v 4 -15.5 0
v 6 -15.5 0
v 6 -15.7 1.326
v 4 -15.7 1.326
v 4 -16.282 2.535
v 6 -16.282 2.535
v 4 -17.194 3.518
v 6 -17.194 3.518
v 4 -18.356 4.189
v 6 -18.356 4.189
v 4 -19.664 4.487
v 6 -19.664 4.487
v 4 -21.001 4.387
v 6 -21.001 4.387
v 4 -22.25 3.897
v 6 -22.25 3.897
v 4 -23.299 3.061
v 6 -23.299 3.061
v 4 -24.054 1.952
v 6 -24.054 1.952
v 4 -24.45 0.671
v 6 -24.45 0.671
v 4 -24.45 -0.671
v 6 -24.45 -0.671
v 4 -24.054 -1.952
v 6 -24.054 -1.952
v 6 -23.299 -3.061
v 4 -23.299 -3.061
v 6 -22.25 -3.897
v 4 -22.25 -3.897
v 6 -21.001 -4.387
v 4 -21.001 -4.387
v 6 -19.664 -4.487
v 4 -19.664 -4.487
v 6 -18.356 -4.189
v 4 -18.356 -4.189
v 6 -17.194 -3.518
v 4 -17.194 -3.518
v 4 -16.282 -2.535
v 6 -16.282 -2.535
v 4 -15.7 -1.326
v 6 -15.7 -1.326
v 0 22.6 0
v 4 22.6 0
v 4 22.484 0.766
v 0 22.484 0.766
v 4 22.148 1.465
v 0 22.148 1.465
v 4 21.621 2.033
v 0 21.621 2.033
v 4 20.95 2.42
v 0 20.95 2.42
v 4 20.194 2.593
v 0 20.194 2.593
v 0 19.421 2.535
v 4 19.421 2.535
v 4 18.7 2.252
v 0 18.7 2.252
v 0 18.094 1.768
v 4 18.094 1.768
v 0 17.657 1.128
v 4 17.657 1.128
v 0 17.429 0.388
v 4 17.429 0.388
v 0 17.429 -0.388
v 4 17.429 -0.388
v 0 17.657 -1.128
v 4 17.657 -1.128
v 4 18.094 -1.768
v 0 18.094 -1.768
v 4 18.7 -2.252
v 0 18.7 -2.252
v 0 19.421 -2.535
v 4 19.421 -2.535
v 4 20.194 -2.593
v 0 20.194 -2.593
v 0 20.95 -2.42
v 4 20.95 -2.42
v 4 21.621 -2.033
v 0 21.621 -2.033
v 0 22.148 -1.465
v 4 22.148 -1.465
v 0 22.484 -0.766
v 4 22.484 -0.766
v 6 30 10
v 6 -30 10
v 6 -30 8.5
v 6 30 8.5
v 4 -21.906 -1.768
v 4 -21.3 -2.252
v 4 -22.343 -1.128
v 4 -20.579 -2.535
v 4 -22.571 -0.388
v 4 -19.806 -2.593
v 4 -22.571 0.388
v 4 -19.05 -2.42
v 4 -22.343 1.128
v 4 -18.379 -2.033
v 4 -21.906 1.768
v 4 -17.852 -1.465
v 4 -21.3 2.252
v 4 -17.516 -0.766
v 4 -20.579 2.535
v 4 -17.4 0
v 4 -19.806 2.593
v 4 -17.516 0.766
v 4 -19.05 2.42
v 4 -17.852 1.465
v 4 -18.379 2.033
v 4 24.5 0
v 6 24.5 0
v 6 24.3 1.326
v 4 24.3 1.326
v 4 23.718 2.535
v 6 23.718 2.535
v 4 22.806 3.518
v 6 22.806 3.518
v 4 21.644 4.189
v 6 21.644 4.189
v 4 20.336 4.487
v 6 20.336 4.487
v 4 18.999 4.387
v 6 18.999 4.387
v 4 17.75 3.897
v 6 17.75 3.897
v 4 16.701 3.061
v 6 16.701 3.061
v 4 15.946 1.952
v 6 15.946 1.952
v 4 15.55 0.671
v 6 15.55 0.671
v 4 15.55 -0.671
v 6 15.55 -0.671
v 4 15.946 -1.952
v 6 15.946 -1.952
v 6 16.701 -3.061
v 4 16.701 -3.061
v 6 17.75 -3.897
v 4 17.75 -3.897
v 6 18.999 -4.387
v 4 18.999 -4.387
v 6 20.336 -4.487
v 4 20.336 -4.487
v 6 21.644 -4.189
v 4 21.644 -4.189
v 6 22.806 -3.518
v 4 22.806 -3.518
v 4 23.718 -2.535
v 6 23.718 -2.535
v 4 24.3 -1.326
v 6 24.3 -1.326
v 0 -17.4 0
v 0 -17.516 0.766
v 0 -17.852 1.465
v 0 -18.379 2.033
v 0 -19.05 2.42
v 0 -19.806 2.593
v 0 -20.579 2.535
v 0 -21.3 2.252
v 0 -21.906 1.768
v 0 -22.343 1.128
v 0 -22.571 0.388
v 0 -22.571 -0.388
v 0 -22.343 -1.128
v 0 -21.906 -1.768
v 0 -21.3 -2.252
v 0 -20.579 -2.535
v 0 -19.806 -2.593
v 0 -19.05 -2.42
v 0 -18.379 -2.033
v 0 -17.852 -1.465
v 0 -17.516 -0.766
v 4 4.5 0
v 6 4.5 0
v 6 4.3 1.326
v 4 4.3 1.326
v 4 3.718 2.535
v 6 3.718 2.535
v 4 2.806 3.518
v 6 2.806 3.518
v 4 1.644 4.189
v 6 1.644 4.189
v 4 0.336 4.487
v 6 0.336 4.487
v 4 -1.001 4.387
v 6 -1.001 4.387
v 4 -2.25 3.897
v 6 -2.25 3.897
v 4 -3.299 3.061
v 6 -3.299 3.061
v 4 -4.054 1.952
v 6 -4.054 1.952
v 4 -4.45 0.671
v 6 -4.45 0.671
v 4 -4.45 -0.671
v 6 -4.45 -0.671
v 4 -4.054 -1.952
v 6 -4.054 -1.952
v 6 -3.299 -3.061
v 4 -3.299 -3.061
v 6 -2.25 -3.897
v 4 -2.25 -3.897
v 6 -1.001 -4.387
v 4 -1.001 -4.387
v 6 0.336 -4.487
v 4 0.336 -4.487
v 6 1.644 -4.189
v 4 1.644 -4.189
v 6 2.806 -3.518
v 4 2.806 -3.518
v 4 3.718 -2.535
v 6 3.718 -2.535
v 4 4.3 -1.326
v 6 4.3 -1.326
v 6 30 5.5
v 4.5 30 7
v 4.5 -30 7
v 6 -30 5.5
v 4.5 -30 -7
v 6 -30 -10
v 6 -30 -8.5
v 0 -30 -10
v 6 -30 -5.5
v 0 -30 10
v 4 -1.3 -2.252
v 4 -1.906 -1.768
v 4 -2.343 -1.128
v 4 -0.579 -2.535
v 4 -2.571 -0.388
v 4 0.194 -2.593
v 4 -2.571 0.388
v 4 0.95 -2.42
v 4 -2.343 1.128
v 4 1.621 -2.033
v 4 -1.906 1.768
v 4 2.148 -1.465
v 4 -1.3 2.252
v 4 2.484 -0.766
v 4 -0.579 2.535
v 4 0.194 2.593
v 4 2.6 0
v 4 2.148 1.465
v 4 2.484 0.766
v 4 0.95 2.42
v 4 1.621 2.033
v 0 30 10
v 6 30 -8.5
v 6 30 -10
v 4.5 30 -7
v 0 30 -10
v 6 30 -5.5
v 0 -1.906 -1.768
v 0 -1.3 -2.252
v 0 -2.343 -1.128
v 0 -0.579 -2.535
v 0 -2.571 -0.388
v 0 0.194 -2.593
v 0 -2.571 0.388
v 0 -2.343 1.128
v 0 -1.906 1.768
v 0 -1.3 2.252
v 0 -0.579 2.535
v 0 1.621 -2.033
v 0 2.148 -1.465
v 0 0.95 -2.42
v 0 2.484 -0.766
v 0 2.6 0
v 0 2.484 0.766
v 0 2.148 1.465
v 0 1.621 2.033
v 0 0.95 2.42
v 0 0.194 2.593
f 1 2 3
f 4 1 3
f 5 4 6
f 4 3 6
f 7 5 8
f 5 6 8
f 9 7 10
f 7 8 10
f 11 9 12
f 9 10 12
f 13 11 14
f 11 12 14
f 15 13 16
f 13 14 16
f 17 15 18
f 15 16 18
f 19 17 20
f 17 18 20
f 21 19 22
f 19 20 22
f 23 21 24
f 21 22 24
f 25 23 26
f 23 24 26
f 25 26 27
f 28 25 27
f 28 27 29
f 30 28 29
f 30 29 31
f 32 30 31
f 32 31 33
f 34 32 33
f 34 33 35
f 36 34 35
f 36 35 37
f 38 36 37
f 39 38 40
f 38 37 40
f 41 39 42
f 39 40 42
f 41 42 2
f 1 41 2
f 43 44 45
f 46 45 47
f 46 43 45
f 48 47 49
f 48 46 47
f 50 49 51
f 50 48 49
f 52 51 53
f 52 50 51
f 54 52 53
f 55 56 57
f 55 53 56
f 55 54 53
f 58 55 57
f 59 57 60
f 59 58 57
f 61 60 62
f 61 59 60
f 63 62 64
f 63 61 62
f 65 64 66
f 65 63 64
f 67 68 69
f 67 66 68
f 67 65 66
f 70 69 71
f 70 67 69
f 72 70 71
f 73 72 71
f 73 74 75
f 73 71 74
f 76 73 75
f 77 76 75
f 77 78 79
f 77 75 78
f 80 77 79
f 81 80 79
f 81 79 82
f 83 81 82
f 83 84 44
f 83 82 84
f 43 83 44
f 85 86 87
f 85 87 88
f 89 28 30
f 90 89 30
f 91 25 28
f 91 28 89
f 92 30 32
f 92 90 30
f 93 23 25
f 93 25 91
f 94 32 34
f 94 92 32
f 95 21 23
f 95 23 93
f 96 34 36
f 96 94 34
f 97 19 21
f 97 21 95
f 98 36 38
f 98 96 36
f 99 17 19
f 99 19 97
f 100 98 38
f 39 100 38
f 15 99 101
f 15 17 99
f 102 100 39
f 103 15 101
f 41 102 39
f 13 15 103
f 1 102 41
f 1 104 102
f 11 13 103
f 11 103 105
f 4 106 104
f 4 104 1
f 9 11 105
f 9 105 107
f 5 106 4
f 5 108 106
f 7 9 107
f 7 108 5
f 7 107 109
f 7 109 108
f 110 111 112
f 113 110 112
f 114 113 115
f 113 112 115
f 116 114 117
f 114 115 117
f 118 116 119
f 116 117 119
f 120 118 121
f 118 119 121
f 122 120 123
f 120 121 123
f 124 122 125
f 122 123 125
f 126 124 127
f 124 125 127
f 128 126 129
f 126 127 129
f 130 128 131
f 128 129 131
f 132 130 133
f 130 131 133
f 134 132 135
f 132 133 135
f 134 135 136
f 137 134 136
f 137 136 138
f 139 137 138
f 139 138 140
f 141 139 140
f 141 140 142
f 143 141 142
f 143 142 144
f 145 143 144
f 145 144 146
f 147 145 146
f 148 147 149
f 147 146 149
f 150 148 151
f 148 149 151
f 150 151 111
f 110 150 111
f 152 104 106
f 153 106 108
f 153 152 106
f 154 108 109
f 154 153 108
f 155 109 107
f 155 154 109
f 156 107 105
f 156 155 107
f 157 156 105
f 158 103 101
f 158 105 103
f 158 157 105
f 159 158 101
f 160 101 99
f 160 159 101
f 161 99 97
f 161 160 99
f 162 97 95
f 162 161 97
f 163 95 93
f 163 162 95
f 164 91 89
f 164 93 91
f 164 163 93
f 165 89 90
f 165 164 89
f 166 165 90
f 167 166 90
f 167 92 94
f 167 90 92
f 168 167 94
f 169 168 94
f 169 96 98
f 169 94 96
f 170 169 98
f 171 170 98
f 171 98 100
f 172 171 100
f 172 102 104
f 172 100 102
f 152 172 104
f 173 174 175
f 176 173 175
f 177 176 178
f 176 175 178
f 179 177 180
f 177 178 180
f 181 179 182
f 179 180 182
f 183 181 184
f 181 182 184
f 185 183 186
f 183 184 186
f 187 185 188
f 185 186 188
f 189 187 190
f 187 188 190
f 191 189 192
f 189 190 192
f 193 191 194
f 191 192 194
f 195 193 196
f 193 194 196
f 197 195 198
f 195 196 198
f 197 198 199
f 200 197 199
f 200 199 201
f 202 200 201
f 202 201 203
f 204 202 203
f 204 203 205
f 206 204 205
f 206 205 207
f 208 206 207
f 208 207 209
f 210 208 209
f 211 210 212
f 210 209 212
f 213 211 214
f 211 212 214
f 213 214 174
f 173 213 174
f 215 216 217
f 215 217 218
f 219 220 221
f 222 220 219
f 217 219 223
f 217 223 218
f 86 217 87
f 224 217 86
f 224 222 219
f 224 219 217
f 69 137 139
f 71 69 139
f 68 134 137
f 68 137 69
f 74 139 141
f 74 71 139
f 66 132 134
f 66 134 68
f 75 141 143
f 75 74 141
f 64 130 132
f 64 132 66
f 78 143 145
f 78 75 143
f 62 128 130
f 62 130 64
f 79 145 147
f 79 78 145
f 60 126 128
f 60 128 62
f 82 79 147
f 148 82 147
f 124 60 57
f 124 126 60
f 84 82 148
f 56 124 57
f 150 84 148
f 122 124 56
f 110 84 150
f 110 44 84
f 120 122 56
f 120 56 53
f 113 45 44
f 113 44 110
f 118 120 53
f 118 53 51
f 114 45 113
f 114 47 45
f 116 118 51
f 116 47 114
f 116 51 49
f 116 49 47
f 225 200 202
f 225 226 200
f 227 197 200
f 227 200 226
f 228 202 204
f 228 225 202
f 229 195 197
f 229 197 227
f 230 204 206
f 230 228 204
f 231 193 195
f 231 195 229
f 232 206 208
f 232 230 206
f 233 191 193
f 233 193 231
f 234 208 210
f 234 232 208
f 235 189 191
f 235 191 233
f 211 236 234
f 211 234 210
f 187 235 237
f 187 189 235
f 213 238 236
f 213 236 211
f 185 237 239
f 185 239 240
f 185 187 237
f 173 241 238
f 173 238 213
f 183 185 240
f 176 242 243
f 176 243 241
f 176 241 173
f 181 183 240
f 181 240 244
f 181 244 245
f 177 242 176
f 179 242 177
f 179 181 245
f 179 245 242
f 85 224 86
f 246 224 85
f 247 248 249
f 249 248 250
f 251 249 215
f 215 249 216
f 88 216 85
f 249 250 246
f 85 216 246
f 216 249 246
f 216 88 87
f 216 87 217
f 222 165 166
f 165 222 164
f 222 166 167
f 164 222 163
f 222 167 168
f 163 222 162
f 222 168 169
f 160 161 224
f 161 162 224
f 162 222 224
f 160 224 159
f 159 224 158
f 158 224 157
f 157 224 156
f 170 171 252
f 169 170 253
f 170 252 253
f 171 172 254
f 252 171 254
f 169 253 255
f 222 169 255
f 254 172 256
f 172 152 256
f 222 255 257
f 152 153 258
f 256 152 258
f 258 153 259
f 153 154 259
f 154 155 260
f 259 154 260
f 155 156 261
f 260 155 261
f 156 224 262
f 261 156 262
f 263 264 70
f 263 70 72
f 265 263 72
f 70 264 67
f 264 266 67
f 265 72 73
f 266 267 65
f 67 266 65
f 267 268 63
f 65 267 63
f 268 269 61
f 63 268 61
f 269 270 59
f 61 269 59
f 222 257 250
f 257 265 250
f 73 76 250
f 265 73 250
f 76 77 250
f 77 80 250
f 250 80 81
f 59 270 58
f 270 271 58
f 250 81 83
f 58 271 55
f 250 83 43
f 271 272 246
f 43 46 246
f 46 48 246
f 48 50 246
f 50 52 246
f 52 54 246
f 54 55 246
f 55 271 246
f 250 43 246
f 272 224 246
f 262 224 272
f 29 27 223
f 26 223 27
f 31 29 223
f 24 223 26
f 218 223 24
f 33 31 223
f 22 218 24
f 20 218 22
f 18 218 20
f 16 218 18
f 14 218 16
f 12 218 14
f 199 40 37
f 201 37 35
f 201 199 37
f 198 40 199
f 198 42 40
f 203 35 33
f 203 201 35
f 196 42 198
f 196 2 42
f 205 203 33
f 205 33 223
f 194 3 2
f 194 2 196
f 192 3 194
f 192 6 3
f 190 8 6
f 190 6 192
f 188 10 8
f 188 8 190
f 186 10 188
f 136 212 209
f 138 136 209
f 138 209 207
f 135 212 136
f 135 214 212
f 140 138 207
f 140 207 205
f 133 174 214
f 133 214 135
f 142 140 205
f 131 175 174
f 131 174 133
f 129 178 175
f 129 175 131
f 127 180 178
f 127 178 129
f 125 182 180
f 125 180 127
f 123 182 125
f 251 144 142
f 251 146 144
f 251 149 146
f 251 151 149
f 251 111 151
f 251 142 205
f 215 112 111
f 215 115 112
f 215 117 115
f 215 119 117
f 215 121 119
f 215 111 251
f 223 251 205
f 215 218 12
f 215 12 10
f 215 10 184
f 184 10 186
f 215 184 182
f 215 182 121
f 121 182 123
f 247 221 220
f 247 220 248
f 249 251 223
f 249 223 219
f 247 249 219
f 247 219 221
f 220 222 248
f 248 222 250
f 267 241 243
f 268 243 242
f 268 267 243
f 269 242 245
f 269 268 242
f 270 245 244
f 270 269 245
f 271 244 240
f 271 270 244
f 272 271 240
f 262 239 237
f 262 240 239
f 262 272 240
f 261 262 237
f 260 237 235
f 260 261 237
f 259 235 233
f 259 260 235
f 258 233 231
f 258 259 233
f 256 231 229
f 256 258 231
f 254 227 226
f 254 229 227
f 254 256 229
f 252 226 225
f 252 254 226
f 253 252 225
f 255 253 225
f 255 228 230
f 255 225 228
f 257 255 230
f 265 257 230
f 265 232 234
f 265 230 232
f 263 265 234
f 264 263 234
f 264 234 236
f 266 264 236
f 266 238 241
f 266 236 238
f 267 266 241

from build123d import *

# Parameters (mm, degrees)
F0_W     = 60
F0_H     = 20
F0_R     = 2.6
F1_DEPTH = 6
F2_R     = 4.5
F3_DEPTH = 2
F5_DEPTH = 60.001


with BuildPart() as f1:
    # F0 (on Right) → F1 (new body)
    with BuildSketch(Plane.YZ):
        Rectangle(F0_W, F0_H)
        with Locations((-20, 0)):
            Circle(F0_R, mode=Mode.SUBTRACT)
        Circle(F0_R, mode=Mode.SUBTRACT)
        with Locations((20, 0)):
            Circle(F0_R, mode=Mode.SUBTRACT)
    extrude(amount=F1_DEPTH)

    # F2 (on face) → F3 (cut)
    with BuildSketch(Plane.YZ.offset(6)):
        with Locations((-20, 0)):
            Circle(F2_R)
        Circle(F2_R)
        with Locations((20, 0)):
            Circle(F2_R)
    extrude(amount=-F3_DEPTH, mode=Mode.SUBTRACT)

    # F4 (on face) → F5 (cut, through all)
    with BuildSketch(Plane.XZ.offset(30)):
        Polygon((6, 8.5), (4.5, 7), (6, 5.5), align=None)
        Polygon((6, -8.5), (6, -5.5), (4.5, -7), align=None)
    extrude(amount=-F5_DEPTH, mode=Mode.SUBTRACT)


solid = f1.part
